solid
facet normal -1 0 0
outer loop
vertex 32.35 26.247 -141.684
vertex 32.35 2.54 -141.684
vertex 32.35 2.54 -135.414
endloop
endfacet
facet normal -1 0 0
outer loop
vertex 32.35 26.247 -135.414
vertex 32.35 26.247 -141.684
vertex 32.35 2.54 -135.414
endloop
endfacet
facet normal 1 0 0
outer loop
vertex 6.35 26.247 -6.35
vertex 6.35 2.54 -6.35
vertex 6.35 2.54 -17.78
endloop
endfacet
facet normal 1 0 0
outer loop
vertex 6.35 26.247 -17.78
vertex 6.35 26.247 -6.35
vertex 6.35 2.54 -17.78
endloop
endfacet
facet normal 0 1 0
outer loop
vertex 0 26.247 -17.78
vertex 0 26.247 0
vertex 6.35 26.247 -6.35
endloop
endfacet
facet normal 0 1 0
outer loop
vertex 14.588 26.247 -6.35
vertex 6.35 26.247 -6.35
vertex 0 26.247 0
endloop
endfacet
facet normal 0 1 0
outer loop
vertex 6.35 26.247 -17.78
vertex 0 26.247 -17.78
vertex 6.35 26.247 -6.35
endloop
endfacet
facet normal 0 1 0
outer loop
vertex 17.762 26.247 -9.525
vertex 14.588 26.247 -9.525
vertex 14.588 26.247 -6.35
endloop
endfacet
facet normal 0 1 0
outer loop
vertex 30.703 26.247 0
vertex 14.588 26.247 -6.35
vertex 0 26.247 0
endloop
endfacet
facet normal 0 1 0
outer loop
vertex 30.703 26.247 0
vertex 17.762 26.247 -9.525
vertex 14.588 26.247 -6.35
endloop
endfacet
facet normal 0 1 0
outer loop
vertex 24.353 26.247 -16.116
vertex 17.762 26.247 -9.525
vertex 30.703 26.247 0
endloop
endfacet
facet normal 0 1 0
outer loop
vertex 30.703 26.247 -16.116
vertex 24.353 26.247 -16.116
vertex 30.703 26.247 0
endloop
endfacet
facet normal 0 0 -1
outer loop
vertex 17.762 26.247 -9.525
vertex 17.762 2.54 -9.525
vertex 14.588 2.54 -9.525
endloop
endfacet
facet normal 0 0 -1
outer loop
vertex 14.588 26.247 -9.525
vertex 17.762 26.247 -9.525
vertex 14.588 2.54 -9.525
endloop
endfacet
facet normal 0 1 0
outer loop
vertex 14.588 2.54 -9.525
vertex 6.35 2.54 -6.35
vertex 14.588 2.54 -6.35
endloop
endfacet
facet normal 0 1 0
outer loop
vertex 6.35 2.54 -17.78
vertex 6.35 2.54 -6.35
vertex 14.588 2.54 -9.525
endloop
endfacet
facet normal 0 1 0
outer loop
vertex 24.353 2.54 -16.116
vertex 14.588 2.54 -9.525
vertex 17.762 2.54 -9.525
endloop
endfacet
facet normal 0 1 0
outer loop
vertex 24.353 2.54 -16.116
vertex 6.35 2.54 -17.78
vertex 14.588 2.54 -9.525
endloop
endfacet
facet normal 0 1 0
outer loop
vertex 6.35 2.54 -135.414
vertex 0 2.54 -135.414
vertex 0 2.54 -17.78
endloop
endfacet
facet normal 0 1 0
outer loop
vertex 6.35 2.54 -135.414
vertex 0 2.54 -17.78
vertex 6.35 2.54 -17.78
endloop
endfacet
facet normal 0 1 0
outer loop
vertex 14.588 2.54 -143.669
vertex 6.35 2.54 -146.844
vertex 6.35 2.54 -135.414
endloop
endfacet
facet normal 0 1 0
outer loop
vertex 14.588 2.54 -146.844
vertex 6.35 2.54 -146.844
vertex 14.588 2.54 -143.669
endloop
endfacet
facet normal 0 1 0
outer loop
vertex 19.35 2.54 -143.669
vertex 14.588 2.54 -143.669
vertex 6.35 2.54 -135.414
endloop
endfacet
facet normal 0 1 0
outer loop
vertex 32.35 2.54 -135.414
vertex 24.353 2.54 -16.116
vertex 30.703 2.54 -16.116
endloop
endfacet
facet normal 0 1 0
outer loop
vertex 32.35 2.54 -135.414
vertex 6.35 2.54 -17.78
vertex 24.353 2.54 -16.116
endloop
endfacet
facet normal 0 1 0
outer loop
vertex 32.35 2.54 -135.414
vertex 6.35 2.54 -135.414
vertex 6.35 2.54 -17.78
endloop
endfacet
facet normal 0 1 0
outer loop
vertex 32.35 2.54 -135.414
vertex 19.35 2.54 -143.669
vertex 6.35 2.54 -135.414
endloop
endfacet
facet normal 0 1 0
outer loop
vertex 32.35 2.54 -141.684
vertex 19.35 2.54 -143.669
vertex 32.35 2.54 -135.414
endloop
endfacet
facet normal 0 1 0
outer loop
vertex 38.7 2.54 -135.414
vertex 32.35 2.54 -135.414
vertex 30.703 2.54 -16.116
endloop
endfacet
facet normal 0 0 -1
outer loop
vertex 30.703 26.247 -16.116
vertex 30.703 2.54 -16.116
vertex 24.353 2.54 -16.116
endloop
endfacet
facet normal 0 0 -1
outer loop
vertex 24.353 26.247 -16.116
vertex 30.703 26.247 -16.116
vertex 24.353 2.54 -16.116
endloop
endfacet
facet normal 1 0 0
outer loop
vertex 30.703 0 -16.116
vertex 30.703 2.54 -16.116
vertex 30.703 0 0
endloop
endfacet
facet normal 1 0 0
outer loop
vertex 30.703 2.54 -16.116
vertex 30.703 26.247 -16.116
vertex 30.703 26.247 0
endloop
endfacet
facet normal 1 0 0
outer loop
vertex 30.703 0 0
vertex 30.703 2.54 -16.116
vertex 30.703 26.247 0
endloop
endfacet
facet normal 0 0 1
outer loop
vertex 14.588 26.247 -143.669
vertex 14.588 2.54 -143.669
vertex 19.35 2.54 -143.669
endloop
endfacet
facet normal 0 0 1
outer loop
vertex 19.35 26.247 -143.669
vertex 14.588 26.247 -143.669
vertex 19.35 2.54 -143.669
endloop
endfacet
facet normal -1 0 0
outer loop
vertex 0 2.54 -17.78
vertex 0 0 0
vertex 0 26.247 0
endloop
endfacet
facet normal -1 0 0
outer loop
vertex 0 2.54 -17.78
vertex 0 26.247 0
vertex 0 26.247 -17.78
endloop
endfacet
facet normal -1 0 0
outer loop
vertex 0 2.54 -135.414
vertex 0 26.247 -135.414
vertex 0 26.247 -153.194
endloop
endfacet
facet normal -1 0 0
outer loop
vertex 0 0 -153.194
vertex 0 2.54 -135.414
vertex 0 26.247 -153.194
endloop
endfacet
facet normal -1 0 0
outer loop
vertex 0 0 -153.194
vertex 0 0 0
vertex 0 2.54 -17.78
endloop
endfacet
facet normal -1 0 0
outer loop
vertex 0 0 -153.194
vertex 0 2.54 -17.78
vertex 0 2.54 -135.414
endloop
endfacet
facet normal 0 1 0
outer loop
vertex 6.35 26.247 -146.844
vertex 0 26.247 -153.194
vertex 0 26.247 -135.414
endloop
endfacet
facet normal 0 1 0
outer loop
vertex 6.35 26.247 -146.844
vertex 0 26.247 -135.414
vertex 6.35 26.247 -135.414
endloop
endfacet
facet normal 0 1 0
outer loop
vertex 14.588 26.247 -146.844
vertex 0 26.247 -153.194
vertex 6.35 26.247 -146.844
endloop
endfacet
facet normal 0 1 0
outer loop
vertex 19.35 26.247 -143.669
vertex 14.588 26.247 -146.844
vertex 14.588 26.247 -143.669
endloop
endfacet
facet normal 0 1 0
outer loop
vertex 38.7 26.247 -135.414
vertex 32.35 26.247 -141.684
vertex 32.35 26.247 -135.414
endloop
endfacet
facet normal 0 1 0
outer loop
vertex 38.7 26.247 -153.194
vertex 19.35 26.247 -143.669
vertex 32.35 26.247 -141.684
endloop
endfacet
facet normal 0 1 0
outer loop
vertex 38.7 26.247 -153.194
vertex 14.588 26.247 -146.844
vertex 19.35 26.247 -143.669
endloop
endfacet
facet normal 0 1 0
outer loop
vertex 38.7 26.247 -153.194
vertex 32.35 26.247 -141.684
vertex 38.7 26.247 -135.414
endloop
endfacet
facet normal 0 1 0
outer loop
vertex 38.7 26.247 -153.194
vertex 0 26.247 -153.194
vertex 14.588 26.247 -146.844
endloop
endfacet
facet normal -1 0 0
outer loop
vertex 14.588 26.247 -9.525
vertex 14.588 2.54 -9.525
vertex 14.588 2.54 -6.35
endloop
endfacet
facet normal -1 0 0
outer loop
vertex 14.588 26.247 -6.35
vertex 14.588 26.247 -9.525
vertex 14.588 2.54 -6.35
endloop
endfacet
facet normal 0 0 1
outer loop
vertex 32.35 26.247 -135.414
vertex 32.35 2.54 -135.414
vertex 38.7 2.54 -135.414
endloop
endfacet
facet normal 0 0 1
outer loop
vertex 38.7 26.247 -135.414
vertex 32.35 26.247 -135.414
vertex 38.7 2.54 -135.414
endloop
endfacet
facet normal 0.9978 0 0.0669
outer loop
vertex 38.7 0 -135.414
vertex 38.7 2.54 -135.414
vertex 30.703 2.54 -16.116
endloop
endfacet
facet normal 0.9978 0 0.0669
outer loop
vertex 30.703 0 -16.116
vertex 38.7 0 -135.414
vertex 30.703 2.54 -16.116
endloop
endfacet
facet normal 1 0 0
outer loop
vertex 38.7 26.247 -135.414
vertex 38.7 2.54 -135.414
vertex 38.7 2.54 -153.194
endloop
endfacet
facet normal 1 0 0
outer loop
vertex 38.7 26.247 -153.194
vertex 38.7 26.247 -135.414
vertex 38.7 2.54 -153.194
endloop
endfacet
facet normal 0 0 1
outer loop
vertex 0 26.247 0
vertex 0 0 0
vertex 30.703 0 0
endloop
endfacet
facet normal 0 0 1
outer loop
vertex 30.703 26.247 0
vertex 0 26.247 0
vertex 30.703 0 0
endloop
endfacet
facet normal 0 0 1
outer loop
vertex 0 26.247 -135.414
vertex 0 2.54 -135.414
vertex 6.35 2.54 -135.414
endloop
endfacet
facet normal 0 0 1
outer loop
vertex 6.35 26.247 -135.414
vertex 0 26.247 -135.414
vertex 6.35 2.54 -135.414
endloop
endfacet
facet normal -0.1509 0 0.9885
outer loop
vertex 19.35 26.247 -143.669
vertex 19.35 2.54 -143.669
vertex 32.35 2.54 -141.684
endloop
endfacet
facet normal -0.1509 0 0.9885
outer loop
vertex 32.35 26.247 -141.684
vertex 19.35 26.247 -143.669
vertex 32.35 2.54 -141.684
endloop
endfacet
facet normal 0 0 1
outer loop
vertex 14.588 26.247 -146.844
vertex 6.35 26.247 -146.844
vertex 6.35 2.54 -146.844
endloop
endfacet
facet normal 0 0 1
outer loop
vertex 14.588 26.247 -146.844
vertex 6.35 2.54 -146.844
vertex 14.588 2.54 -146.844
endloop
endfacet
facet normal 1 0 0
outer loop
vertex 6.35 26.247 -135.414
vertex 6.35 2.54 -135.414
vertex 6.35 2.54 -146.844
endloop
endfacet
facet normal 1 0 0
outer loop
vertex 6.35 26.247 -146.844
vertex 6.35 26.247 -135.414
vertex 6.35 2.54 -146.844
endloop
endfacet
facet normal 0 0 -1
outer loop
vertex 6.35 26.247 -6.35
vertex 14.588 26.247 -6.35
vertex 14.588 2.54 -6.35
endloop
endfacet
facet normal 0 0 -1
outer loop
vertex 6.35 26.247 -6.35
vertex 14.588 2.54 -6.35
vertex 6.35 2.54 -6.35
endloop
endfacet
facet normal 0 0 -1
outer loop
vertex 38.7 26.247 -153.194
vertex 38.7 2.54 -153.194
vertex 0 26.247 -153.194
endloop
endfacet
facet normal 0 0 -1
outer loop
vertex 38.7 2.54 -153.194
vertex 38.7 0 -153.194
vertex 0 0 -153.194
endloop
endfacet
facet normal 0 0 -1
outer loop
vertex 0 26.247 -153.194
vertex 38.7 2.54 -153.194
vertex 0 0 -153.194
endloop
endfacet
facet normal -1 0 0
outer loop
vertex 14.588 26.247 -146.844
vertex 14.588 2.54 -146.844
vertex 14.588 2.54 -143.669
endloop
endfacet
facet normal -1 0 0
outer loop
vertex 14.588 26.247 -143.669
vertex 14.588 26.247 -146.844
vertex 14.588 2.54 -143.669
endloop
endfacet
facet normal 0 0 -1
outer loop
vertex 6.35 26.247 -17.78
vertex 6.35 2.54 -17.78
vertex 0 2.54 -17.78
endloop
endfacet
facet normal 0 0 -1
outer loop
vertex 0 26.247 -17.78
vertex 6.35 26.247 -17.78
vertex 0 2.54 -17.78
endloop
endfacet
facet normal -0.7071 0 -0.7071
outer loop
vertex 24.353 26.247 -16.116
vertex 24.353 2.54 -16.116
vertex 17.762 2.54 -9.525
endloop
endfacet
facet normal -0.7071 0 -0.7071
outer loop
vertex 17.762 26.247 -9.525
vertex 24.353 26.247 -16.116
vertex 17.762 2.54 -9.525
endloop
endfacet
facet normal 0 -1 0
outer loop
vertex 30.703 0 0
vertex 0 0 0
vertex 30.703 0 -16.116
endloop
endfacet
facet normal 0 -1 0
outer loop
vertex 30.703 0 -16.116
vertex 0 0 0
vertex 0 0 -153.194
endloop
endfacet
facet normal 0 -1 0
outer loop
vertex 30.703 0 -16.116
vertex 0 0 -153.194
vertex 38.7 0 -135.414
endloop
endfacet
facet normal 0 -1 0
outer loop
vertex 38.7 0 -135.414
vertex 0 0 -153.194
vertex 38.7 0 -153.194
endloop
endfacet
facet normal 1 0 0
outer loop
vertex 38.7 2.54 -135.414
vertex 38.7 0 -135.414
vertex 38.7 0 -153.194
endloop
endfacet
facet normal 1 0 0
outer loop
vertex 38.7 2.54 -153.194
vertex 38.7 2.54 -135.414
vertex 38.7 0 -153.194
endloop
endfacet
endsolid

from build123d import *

# Parameters (mm, degrees)
SKETCH1_W           = 38.699948
SKETCH1_H           = 153.19375
BOSS_EXTRUDE1_DEPTH = 2.54
BOSS_EXTRUDE2_DEPTH = 23.706666582
CUT_EXTRUDE1_DEPTH  = 160.77490754


with BuildPart() as part:
    # Sketch1 → Boss-Extrude1 (new body)
    with BuildSketch(Plane(origin=(0, 0, 0), x_dir=(1, 0, 0), z_dir=(0, 1, 0))):
        with Locations((19.349974, 76.596875)):
            Rectangle(SKETCH1_W, SKETCH1_H)
    extrude(amount=BOSS_EXTRUDE1_DEPTH)

    # Sketch3 → Boss-Extrude2 (add)
    with BuildSketch(Plane(origin=(0, 2.54, 0), x_dir=(1, 0, 0), z_dir=(0, 1, 0))):
        Polygon((6.35, 146.84375), (14.5875, 146.84375), (14.5875, 143.66875), (19.35, 143.66875), (32.35, 141.684375), (32.35, 135.41375), (38.7, 135.41375), (38.7, 153.19375), (0, 153.19375), (0, 135.41375), (6.35, 135.41375), align=None)
        Polygon((17.7625, 9.525), (14.5875, 9.525), (14.5875, 6.35), (6.35, 6.35), (6.35, 17.78), (0, 17.78), (0, 0), (30.703239638, 0), (30.703239638, 16.115739638), (24.353239638, 16.115739638), align=None)
    extrude(amount=BOSS_EXTRUDE2_DEPTH)

    # Sketch4 → Cut-Extrude1 (cut, through all)
    with BuildSketch(Plane(origin=(0, 2.54, 0), x_dir=(1, 0, 0), z_dir=(0, 1, 0))):
        Polygon((30.703239638, 0), (38.699948, 0), (38.699948, 135.41375), (30.703239638, 16.115739638), align=None)
    extrude(amount=-CUT_EXTRUDE1_DEPTH, mode=Mode.SUBTRACT)


solid = part.part
